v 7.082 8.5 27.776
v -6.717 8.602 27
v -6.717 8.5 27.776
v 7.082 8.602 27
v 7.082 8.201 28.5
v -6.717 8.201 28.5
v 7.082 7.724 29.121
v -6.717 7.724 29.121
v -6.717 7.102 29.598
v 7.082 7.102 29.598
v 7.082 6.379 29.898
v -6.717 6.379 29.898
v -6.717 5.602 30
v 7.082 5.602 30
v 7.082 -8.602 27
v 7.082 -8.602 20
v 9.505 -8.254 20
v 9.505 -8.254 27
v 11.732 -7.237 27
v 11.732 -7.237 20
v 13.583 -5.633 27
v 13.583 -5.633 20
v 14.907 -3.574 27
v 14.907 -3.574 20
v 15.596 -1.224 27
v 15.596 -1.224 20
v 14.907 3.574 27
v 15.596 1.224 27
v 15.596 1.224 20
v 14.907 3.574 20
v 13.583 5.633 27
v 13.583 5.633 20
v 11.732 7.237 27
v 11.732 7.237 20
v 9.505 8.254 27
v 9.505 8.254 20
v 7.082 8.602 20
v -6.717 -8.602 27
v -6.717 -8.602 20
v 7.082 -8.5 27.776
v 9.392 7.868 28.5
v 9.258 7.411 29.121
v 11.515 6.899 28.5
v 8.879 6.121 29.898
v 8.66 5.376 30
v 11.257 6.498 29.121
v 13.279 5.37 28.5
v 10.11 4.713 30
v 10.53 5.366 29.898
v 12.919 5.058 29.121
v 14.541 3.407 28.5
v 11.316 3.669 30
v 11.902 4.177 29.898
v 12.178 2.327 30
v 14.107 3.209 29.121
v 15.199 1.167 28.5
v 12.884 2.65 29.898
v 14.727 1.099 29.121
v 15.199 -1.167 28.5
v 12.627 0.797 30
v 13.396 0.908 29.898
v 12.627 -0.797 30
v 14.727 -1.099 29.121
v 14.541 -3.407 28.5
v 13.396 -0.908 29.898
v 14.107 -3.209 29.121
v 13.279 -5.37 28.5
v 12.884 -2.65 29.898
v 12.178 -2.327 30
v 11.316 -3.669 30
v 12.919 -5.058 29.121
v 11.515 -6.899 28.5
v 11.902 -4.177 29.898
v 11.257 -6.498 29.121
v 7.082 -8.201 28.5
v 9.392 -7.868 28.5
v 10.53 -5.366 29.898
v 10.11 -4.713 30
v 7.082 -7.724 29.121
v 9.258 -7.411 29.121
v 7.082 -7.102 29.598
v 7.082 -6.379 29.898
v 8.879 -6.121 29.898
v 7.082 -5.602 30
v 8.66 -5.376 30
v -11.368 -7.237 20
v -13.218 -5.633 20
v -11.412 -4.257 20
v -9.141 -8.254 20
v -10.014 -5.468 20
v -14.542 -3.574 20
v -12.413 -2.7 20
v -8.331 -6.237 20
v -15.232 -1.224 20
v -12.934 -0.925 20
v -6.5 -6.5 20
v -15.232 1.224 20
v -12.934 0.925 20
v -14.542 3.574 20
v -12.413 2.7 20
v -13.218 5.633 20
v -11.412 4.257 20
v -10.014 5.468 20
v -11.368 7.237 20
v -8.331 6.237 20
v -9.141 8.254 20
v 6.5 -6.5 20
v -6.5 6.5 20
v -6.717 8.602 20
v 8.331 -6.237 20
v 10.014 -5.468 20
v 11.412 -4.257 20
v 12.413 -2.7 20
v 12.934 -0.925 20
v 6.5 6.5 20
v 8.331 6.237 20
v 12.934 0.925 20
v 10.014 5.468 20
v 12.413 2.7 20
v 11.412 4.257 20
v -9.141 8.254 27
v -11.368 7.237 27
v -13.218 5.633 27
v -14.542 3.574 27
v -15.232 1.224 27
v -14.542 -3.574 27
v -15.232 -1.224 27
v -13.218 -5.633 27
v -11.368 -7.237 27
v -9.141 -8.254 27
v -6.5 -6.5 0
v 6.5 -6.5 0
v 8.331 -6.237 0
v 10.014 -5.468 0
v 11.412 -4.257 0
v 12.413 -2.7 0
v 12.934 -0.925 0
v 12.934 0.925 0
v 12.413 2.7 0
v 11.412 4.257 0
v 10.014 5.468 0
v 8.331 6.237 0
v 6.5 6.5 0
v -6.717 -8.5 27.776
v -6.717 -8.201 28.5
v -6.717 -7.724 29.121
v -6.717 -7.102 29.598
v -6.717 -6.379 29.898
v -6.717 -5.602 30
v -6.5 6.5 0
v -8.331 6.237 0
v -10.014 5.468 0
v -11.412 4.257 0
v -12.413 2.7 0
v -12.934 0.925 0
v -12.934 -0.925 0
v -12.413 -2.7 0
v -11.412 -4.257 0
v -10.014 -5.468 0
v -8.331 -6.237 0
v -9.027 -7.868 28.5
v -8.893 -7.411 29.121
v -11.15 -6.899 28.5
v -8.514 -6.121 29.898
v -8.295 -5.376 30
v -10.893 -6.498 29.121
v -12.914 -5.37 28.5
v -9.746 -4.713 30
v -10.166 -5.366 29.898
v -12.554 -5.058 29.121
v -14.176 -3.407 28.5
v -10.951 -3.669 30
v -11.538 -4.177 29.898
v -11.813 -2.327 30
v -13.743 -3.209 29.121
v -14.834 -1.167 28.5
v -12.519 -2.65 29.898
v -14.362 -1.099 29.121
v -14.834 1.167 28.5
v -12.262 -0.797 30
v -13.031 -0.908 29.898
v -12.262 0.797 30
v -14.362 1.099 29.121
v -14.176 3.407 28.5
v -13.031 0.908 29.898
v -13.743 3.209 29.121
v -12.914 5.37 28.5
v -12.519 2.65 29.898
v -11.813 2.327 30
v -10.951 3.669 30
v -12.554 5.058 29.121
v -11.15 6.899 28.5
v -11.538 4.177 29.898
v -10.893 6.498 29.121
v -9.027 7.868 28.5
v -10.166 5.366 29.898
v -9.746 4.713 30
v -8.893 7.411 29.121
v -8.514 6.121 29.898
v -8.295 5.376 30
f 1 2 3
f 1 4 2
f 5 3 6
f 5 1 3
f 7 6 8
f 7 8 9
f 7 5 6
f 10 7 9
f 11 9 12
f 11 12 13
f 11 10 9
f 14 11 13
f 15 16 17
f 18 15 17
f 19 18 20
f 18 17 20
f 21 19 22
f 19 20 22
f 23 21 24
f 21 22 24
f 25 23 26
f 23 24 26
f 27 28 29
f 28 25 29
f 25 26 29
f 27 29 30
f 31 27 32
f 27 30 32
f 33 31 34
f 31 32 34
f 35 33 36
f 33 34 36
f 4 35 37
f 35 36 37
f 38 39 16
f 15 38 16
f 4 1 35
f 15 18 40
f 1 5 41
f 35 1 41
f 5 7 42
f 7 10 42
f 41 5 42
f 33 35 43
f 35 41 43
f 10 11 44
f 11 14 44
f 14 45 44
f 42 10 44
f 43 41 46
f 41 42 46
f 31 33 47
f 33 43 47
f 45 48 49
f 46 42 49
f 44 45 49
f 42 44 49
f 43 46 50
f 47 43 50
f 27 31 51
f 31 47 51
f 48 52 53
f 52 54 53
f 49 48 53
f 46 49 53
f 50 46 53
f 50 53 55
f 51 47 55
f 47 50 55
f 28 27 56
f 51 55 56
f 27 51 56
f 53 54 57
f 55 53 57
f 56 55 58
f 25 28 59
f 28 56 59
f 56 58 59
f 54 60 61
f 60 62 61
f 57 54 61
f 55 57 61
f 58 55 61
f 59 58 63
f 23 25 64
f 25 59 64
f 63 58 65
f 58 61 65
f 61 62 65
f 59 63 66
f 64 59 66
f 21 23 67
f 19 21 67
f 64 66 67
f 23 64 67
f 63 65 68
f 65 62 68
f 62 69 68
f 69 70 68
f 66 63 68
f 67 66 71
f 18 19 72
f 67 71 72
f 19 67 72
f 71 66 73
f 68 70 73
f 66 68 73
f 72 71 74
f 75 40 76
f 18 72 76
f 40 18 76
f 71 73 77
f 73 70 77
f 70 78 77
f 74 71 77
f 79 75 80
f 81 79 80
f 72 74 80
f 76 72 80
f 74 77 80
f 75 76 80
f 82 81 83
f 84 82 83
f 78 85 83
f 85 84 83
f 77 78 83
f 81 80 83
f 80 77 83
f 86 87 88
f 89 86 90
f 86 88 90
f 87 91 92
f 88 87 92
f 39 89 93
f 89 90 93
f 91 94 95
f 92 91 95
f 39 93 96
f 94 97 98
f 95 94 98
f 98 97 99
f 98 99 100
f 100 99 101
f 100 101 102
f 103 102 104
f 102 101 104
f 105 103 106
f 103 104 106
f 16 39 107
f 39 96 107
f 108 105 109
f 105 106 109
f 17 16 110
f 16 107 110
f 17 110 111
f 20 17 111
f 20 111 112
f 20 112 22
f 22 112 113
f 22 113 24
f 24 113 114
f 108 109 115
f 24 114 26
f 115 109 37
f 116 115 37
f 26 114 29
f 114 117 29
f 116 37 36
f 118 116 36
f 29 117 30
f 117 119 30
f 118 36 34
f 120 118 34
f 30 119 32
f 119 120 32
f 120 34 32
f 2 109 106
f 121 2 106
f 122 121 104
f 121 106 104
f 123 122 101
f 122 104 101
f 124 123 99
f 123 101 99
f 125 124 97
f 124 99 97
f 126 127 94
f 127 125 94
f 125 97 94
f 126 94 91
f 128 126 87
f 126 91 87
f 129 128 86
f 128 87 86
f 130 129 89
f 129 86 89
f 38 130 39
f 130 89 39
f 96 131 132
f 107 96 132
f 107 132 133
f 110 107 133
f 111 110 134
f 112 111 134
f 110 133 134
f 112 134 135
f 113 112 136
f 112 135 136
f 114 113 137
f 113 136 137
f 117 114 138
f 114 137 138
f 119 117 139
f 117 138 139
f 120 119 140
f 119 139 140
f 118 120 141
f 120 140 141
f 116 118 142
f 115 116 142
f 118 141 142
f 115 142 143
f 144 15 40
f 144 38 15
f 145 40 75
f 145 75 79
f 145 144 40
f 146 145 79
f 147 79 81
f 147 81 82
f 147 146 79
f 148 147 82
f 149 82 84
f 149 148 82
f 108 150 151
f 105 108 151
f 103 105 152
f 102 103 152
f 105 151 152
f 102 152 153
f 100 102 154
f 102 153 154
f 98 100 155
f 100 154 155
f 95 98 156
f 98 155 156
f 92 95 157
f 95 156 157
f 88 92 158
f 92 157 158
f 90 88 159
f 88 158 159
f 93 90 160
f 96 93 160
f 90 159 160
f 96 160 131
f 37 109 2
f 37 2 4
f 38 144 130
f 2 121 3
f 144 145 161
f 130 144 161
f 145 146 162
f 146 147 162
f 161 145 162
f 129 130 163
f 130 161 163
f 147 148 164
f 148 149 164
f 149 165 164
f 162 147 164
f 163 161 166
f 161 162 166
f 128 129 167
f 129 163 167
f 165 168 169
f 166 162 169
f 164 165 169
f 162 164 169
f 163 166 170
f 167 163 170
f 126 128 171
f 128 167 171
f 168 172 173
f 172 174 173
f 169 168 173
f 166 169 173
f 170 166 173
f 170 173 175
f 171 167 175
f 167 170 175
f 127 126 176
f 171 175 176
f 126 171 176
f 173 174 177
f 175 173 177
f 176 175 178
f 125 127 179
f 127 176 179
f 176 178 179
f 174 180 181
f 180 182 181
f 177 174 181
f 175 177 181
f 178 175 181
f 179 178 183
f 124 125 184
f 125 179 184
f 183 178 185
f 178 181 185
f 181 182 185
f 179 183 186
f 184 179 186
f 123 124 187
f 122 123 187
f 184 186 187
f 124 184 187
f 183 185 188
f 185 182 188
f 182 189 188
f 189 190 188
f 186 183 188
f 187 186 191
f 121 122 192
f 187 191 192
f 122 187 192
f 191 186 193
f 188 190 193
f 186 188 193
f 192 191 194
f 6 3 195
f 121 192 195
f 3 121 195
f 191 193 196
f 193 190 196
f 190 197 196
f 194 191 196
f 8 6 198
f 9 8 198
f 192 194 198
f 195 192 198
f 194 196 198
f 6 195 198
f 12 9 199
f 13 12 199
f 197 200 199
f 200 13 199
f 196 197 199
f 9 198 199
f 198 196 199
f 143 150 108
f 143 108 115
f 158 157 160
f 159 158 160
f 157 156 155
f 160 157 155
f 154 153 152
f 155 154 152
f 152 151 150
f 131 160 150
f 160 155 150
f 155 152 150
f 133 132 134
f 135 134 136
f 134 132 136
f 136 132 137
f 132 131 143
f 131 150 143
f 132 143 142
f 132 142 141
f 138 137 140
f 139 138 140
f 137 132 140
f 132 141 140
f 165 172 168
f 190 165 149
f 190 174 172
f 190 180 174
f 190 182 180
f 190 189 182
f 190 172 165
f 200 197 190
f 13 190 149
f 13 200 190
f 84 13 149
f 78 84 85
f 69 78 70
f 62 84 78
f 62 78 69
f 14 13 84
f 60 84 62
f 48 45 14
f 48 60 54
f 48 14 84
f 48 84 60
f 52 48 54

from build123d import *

# Parameters (mm, degrees)
PAD_DEPTH    = 20
PAD001_DEPTH = 10
FILLET_R     = 3


with BuildPart() as part:
    # Sketch → Pad (new body)
    with BuildSketch(Plane.XY):
        with BuildLine():
            ThreePointArc((-6.5, 6.5), (-13, 0), (-6.5, -6.5))
            Line((-6.5, -6.5), (6.5, -6.5))
            ThreePointArc((6.5, -6.5), (13, 0), (6.5, 6.5))
            Line((-6.5, 6.5), (6.5, 6.5))
        make_face()
    extrude(amount=PAD_DEPTH)

    # Sketch001 (on Face6 of Pad) → Pad001 (join)
    with BuildSketch(Plane.XY.offset(20)):
        with BuildLine():
            ThreePointArc((-6.716935, 8.602443), (-15.319378, 0), (-6.716935, -8.602443))
            Line((-6.716935, -8.602443), (7.081573, -8.602443))
            ThreePointArc((7.081573, -8.602443), (15.684016, 0), (7.081573, 8.602443))
            Line((-6.716935, 8.602443), (7.081573, 8.602443))
        make_face()
    extrude(amount=PAD001_DEPTH)

    # Fillet
    fillet_edges = [part.edges().sort_by_distance(p)[0] for p in [
        (0.182319, 8.602443, 30),
        (-15.319378, 0, 30),
        (0.182319, -8.602443, 30),
        (15.684016, 0, 30),
    ]]
    fillet(fillet_edges, radius=FILLET_R)


solid = part.part
